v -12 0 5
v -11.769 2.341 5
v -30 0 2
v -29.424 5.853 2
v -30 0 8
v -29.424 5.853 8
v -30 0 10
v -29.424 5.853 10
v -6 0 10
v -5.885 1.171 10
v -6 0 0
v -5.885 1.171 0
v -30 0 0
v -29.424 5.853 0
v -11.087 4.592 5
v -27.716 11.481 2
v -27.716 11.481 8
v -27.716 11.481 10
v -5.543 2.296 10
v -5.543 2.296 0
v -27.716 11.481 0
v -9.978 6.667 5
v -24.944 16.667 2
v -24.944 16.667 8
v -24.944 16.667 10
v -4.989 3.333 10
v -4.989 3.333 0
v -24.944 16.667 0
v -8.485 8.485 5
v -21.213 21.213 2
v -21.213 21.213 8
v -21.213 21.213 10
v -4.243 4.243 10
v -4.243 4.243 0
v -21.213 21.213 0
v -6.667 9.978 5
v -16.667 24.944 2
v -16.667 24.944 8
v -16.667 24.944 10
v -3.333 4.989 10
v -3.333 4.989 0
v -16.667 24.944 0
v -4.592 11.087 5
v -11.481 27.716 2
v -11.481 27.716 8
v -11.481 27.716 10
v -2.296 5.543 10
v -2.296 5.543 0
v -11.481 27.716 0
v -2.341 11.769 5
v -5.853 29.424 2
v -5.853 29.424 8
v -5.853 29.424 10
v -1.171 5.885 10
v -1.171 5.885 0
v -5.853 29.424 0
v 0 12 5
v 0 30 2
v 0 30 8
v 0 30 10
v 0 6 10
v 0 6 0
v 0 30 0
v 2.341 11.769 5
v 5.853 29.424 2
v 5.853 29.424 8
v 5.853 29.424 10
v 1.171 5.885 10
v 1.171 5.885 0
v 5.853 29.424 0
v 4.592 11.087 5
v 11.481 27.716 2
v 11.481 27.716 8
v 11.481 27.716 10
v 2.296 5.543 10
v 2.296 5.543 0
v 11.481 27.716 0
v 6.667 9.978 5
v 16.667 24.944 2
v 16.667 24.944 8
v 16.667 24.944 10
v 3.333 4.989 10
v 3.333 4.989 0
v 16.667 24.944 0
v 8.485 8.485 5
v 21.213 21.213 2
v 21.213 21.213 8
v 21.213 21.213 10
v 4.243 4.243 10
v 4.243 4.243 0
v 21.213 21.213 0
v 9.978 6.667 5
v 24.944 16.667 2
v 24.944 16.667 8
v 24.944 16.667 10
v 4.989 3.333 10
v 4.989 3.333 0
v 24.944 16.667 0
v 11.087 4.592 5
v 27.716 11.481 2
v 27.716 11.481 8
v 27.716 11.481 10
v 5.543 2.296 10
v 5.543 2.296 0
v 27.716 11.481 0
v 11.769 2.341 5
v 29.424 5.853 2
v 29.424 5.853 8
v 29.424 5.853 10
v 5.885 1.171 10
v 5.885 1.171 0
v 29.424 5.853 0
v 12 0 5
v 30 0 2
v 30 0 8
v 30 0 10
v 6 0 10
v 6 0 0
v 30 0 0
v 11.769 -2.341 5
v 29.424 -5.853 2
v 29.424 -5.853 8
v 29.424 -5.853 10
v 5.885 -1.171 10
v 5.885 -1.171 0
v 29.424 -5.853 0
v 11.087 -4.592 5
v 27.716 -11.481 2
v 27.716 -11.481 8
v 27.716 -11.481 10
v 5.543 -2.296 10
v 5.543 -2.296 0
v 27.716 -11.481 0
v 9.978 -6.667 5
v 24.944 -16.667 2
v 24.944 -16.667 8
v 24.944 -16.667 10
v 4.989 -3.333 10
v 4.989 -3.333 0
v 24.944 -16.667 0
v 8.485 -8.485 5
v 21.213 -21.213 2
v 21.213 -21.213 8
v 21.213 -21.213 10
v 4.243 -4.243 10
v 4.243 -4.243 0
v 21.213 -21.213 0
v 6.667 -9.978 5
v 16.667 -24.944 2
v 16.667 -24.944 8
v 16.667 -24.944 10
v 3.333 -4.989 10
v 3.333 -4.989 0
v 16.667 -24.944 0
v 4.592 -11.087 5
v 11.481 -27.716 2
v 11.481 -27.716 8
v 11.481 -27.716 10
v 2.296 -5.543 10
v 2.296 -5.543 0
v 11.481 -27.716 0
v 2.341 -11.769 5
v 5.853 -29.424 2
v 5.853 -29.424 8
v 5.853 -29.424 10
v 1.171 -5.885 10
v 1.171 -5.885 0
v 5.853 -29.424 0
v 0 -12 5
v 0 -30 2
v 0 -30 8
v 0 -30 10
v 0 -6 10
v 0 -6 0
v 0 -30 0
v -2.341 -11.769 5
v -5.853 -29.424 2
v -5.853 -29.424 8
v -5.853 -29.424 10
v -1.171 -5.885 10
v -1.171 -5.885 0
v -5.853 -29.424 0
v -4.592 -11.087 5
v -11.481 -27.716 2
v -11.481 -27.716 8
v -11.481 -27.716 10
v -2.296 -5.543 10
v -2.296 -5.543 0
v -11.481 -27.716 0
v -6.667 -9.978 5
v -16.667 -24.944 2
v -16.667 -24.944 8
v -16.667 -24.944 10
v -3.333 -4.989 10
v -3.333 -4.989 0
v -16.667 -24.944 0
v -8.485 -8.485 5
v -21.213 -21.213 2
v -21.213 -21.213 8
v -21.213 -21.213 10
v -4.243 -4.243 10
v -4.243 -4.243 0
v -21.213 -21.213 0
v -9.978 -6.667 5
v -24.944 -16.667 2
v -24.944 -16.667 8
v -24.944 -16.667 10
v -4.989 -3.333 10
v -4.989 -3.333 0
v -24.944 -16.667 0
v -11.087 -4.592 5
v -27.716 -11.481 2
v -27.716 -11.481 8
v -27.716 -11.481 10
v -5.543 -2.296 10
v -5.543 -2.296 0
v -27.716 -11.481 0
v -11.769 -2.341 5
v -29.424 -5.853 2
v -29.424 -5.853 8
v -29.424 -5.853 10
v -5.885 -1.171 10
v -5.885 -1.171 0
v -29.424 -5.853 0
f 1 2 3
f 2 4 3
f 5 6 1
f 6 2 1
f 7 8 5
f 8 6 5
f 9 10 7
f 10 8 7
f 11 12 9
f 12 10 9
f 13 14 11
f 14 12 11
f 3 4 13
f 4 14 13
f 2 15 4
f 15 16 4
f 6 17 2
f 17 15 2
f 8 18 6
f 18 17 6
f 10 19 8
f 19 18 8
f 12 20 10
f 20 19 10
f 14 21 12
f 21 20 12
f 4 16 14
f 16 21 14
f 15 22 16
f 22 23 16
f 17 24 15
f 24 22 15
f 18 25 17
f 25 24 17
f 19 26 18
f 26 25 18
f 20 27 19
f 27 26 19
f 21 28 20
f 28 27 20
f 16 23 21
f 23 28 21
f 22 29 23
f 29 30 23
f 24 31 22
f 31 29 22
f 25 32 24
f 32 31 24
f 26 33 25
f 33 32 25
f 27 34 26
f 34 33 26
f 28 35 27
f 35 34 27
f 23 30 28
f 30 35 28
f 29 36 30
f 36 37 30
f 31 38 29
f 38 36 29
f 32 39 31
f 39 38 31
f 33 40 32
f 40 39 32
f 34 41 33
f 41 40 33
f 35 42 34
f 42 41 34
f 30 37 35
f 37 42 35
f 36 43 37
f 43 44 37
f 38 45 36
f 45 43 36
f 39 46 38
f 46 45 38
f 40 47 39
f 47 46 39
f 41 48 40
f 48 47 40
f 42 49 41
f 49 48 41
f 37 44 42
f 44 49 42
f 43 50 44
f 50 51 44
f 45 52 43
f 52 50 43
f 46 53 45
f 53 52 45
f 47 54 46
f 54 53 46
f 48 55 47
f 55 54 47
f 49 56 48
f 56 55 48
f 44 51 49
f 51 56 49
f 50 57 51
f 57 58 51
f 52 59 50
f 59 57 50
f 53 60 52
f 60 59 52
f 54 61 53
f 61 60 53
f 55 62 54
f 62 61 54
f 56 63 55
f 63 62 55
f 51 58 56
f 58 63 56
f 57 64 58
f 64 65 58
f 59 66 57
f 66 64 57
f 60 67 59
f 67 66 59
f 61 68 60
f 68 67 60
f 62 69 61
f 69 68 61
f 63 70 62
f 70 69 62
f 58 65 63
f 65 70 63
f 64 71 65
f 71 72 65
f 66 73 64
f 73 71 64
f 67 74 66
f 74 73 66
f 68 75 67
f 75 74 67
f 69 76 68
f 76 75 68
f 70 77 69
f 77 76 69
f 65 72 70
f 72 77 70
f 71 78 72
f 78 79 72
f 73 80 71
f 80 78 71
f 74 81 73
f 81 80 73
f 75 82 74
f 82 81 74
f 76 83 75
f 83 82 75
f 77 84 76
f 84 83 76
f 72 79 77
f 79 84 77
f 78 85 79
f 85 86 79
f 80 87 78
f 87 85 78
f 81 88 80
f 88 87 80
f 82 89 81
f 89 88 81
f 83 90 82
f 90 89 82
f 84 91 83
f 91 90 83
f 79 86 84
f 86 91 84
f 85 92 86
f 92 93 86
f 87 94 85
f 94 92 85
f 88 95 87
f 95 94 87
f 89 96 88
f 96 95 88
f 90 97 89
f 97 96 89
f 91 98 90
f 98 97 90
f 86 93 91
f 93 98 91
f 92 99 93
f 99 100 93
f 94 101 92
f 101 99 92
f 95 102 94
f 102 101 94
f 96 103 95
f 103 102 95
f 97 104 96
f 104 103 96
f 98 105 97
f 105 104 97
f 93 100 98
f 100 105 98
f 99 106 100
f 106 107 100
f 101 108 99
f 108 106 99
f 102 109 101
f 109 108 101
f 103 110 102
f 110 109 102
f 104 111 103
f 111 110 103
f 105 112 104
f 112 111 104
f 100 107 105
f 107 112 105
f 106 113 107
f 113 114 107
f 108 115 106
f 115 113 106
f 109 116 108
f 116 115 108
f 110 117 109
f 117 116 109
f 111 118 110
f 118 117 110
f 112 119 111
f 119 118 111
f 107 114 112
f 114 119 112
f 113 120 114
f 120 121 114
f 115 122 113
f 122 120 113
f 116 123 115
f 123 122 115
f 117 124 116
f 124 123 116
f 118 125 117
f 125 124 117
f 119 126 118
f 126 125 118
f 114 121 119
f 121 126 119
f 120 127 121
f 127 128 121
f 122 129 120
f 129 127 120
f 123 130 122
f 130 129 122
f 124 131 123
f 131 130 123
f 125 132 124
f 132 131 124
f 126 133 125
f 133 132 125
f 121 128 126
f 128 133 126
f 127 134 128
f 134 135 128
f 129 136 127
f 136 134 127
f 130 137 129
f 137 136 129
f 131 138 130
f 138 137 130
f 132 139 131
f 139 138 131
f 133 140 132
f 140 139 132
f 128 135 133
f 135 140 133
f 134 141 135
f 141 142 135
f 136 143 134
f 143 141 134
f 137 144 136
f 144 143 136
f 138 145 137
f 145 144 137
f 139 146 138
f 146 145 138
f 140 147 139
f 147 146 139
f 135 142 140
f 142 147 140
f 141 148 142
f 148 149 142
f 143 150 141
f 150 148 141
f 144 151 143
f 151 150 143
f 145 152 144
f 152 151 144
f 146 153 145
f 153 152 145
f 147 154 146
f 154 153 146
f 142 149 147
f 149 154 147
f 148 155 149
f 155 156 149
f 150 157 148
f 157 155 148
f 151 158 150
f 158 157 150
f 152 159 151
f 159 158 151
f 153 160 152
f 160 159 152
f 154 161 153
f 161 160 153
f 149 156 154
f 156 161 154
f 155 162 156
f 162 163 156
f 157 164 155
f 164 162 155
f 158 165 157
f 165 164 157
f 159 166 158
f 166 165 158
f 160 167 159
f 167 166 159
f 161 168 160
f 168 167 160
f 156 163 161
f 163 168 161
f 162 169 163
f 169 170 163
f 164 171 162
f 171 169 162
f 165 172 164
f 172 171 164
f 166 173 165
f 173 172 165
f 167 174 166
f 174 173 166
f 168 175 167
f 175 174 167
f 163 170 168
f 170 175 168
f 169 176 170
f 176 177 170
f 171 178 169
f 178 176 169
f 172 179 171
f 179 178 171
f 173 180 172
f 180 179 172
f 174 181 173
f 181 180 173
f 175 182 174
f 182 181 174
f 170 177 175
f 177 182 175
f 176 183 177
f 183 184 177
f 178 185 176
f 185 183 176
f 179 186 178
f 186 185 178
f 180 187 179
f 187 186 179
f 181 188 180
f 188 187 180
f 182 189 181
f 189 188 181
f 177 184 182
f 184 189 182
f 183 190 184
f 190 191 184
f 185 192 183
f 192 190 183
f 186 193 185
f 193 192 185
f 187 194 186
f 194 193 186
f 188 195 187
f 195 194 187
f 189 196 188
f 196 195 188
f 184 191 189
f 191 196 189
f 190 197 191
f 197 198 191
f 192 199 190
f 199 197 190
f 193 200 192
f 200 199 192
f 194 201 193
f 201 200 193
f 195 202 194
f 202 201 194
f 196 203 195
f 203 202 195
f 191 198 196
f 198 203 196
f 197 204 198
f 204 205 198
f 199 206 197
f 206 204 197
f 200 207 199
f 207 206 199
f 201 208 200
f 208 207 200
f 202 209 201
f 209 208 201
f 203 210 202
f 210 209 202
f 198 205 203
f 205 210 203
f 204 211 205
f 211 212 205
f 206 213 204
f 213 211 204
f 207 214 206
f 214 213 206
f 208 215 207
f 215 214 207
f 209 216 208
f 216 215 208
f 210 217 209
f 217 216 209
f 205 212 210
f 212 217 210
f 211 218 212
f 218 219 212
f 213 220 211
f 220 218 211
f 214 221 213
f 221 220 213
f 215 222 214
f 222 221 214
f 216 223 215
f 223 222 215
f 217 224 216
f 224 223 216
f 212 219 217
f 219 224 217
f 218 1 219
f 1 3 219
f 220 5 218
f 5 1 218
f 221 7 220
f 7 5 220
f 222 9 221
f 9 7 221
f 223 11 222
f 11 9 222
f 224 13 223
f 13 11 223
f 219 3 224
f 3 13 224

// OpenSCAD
$fn = 32;

// ----------------------------------------------------------------------
// Revolved part: V-groove pulley R30
// ----------------------------------------------------------------------

// --- parameters (mm) ---
bore_r = 6;               // bore radius
rim_r = 30;               // rim radius
rim_t = 10;               // rim width
groove_r = 12;            // groove root radius
groove_w = 3;             // groove half width
revolve_angle = 360;      // revolve sweep, degrees

bore_d = 2 * bore_r;
rim_d = 2 * rim_r;
groove_d = 2 * groove_r;

profile = [[6, 0], [30, 0], [30, 2], [12, 5], [30, 8], [30, 10], [6, 10]];  // primary outline, 7 points, counter clockwise

// --- the one profile operation ---
rotate_extrude(angle = revolve_angle) polygon(points = profile);
